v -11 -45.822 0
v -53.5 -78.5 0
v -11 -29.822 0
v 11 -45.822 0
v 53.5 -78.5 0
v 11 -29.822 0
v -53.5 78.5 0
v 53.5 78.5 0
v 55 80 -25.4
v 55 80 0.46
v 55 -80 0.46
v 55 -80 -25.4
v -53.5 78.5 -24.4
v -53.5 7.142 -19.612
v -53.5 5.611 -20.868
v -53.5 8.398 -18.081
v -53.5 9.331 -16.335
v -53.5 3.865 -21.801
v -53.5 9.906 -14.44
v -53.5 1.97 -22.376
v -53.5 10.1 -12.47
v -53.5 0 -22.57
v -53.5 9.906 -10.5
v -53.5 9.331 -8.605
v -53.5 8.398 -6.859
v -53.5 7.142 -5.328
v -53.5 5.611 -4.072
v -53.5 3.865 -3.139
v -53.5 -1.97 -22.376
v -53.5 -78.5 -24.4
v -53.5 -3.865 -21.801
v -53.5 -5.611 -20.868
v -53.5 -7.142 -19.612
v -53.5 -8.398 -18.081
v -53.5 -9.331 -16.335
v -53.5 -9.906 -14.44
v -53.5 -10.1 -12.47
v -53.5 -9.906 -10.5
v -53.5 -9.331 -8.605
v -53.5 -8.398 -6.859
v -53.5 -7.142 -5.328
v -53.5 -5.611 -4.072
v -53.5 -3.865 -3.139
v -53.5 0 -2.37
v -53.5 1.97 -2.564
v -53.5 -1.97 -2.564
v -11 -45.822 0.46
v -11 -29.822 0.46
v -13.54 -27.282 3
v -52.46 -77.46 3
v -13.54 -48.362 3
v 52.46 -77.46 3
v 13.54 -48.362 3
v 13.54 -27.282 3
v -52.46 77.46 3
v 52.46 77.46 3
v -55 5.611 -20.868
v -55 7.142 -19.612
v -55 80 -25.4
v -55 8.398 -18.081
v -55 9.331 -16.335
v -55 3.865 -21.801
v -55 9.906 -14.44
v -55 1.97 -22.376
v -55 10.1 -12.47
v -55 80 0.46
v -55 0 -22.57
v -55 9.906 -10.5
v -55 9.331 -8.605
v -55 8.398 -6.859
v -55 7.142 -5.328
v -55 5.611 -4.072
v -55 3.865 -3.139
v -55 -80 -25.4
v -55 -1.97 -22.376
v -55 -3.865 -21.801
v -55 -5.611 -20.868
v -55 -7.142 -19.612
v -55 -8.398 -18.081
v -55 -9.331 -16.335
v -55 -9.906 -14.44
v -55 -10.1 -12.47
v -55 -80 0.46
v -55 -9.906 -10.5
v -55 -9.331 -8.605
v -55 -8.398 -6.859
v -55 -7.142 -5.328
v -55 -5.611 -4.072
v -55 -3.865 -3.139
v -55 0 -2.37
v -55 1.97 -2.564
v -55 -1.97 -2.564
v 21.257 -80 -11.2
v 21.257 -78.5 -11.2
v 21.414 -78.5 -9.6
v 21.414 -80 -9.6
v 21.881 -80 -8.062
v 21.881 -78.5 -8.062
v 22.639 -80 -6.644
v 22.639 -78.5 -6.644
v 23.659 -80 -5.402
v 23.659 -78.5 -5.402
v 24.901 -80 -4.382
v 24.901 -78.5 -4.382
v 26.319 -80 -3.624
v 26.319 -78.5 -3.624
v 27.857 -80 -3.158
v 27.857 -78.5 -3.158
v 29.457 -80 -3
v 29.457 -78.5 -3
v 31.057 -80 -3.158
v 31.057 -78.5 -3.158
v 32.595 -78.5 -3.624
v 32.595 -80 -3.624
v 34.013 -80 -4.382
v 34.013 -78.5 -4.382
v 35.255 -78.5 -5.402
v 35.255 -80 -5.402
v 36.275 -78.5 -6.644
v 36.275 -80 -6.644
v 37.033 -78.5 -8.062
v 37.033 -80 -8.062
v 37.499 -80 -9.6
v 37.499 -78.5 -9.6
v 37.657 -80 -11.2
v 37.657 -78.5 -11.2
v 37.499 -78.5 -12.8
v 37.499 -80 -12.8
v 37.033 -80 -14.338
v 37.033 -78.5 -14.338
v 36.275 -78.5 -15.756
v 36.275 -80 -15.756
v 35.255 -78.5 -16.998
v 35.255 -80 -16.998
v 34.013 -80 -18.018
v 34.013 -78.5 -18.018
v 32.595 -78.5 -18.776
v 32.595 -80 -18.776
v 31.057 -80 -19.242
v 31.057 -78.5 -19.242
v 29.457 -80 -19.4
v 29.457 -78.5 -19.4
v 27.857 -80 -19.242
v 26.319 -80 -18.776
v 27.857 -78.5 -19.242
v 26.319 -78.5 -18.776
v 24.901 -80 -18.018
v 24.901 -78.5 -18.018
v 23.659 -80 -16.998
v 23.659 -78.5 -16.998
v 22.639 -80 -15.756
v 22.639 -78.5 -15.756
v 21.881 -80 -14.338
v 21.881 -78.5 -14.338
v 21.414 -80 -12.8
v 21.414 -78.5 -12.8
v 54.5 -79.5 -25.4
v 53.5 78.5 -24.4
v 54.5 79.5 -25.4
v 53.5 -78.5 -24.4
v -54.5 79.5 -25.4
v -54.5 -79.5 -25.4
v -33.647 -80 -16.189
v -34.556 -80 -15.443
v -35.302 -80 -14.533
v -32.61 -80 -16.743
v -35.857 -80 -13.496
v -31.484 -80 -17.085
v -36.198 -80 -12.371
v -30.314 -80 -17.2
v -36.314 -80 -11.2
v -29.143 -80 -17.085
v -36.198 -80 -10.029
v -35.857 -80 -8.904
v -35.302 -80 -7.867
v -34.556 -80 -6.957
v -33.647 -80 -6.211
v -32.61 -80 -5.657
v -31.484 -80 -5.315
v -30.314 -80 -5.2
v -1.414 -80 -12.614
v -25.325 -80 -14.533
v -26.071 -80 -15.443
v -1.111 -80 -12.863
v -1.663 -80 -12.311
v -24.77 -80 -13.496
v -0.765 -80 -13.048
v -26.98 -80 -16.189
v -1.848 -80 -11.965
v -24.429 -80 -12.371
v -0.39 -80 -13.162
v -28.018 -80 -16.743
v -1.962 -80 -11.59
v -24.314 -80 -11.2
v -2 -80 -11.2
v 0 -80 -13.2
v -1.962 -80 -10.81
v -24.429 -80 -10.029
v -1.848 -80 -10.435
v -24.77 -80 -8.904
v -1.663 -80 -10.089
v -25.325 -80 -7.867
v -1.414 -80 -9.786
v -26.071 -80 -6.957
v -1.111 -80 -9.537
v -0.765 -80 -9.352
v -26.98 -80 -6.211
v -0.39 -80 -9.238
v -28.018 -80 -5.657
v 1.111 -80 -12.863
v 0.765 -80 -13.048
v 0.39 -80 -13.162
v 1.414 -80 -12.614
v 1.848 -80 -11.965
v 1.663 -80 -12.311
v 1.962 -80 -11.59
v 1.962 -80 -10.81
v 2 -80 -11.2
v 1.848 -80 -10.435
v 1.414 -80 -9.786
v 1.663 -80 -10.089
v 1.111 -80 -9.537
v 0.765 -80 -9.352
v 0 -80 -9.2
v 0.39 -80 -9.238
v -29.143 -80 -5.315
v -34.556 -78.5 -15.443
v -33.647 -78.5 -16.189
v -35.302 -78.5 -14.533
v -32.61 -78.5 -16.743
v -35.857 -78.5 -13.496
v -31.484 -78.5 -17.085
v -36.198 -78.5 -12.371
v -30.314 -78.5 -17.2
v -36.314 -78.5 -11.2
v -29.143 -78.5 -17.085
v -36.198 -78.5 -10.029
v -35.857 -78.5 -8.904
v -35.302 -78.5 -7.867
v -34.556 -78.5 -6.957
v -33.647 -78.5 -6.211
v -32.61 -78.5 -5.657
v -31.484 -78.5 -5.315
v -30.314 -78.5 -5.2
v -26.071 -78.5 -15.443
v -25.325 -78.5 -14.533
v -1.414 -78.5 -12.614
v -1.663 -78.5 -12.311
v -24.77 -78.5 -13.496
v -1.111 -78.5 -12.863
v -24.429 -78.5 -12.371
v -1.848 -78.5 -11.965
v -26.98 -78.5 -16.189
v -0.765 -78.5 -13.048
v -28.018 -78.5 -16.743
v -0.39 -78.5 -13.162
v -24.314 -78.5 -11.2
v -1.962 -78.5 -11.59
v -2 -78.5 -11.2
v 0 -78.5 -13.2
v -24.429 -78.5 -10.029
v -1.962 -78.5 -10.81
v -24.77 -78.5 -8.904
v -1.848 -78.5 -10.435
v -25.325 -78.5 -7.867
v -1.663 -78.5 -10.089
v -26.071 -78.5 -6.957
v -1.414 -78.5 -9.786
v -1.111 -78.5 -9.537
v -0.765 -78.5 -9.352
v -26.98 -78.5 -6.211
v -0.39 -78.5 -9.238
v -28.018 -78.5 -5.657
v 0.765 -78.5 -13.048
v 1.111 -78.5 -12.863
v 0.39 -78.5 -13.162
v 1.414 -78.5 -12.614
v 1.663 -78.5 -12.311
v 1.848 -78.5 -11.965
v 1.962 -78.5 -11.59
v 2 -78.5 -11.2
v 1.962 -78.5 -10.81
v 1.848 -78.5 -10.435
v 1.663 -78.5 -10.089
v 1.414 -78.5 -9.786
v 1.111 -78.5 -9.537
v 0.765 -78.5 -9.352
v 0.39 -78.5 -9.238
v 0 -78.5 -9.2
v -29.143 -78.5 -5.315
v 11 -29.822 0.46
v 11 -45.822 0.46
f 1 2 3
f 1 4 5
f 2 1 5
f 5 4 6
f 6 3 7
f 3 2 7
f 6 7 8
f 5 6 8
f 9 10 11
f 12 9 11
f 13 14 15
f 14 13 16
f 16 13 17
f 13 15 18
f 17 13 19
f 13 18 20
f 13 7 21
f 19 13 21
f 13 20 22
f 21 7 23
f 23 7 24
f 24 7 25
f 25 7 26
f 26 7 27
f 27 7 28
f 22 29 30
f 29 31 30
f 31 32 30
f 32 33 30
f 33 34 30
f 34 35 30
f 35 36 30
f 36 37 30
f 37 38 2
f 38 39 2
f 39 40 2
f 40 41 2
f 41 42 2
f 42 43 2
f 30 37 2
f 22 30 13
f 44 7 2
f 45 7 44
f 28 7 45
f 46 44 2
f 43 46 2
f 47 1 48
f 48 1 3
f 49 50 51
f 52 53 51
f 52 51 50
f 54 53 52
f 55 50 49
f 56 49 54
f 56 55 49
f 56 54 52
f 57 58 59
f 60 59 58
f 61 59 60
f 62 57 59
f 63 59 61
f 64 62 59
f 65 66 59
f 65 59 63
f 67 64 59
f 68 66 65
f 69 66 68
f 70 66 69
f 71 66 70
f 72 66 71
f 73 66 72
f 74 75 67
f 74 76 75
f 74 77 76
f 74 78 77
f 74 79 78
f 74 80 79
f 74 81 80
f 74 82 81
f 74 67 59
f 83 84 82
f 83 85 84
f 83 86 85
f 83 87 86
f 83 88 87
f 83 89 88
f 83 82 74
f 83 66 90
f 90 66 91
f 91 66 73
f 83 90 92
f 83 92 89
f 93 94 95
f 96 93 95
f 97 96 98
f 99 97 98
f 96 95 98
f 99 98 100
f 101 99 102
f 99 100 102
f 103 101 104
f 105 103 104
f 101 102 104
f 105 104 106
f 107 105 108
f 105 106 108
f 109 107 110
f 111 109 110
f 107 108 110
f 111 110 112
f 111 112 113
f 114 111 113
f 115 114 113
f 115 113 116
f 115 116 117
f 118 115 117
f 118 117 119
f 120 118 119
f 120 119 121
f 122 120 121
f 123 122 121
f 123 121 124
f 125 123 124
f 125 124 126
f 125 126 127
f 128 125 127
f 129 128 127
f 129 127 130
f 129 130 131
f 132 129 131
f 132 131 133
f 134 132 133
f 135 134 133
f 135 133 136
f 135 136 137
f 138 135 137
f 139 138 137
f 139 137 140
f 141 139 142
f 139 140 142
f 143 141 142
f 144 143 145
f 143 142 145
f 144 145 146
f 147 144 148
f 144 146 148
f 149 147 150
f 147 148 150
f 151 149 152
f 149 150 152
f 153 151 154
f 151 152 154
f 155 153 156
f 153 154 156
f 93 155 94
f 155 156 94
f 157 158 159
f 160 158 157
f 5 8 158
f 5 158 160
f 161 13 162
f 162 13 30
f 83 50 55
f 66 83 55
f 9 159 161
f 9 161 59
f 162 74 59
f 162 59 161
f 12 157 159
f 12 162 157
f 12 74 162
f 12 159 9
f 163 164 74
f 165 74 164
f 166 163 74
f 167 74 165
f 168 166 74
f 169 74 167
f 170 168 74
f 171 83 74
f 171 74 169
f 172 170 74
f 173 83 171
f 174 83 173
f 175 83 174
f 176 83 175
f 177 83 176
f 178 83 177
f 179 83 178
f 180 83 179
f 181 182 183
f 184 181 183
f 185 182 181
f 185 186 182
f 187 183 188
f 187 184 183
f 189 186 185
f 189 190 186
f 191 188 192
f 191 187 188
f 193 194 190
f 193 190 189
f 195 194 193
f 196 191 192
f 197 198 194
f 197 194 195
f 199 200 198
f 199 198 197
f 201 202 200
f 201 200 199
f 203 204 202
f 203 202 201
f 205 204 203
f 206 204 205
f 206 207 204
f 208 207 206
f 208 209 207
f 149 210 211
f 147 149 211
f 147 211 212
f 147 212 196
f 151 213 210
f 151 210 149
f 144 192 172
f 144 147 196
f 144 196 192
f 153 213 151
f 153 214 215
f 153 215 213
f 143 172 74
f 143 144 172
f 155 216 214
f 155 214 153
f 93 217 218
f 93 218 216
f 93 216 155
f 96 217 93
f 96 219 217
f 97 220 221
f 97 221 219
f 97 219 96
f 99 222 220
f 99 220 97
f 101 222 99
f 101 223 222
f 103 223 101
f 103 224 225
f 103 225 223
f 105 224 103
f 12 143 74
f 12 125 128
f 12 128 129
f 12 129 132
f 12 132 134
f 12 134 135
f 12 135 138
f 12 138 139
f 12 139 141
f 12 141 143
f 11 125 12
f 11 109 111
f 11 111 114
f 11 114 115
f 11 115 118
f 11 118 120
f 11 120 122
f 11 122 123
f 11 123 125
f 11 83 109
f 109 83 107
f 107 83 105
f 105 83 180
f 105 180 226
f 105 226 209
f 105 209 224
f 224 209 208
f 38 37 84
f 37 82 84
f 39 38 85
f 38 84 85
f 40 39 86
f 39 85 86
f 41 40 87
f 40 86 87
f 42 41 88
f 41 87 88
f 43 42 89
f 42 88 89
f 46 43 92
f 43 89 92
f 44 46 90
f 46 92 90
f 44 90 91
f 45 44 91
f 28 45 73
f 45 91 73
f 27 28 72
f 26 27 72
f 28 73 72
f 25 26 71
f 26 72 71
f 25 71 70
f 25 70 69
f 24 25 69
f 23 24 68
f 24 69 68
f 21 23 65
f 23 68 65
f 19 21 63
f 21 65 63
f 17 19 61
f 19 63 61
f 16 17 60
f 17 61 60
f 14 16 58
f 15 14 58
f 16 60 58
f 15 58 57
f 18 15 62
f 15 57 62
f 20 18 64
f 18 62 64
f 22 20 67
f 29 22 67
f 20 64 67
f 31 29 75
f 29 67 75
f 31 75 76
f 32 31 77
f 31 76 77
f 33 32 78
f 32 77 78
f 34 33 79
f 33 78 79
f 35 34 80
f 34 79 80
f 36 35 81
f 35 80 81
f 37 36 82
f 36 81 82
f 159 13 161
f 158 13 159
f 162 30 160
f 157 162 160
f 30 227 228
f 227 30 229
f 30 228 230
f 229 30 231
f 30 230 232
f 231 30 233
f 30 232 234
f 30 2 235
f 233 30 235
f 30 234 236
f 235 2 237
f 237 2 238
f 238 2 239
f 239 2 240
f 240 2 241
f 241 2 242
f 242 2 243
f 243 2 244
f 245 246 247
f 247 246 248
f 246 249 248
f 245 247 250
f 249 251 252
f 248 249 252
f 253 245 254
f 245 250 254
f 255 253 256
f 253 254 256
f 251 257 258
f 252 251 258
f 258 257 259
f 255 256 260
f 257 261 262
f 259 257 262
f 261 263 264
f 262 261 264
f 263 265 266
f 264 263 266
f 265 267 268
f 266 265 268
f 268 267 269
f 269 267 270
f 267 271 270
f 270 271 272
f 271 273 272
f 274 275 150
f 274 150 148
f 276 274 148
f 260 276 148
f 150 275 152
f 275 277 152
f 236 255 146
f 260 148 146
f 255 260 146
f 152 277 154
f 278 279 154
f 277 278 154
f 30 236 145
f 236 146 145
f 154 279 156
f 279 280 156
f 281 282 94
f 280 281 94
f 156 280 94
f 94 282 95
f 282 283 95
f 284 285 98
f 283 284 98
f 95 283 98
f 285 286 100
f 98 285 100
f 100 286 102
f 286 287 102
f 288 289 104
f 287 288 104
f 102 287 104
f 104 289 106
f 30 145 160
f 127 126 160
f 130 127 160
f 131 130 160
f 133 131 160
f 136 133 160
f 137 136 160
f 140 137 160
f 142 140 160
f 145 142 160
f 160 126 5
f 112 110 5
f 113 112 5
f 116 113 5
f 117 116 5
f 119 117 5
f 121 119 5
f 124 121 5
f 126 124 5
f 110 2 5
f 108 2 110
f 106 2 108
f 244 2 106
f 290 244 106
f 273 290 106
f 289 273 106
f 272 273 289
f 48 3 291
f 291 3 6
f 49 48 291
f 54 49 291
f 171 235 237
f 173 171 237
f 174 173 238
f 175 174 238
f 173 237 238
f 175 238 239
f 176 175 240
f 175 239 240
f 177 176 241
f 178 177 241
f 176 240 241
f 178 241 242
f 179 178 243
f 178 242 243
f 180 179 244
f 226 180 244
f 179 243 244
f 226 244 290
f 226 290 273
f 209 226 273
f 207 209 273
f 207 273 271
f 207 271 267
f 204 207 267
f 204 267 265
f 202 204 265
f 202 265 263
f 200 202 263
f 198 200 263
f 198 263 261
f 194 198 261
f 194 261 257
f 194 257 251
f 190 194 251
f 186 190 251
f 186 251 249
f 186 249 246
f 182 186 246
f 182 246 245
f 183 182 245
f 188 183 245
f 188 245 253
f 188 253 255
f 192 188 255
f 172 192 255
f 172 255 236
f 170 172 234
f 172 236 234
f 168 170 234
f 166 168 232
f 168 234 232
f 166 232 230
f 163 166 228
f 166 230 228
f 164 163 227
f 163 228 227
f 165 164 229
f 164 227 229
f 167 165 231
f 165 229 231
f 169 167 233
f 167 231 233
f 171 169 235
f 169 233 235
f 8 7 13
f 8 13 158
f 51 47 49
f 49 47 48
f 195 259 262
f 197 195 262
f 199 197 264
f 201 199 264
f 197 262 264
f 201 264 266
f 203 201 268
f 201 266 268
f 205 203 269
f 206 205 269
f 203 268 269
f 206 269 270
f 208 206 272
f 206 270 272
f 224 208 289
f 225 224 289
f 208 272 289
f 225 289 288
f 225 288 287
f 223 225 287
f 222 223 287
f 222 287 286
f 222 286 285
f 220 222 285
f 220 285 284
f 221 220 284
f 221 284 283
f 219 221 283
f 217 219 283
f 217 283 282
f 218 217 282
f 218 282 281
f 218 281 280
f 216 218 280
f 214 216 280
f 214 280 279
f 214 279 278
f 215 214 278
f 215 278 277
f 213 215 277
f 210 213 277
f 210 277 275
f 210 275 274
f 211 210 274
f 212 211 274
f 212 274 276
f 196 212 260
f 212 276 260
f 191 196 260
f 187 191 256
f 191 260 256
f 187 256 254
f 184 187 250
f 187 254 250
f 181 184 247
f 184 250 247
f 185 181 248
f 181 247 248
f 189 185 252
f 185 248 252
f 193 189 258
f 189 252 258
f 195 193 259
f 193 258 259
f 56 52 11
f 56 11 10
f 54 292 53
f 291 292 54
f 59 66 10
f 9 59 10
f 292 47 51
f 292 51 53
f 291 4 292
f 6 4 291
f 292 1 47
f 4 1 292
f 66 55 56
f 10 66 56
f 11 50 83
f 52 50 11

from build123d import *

# Parameters (mm, degrees)
F0_W      = 110
F0_H      = 160
F0_W_2    = 22
F0_H_2    = 16
F1_DEPTH  = 3
F2_W      = 110
F2_H      = 160
F2_W_2    = 107
F2_H_2    = 157
F3_DEPTH  = 25.4
F5_D      = 16.4
F5_DEPTH  = 7.62
F6_D      = 4
F6_DEPTH  = 7.62
F7_D      = 12
F7_DEPTH  = 7.62
F8_SIZE   = 1
F9_SIZE   = 2.54
F10_R     = 10.1
F11_DEPTH = 12.7


with BuildPart() as f1:
    # F0 (on Top) → F1 (new body)
    with BuildSketch(Plane.XY):
        Rectangle(F0_W, F0_H)
        with Locations((0, -37.821583)):
            Rectangle(F0_W_2, F0_H_2, mode=Mode.SUBTRACT)
    extrude(amount=F1_DEPTH)

    # F2 (on face) → F3 (join)
    with BuildSketch(Plane(origin=(0, 0, 0), x_dir=(1, 0, 0), z_dir=(0, 0, -1))):
        Rectangle(F2_W, F2_H)
        Rectangle(F2_W_2, F2_H_2, mode=Mode.SUBTRACT)
    extrude(amount=F3_DEPTH)

    # F5
    with Locations(Plane.XZ.offset(80)):
        with Locations((29.456884, -11.2)):
            Hole(F5_D / 2, depth=F5_DEPTH)

    # F6
    with Locations(Plane.XZ.offset(80)):
        with Locations((0, -11.2)):
            Hole(F6_D / 2, depth=F6_DEPTH)

    # F7
    with Locations(Plane.XZ.offset(80)):
        with Locations((-30.313604, -11.2)):
            Hole(F7_D / 2, depth=F7_DEPTH)

    # F8
    f8_edges = [f1.edges().sort_by_distance(p)[0] for p in [
        (53.5, 0, -25.4),
        (0, 78.5, -25.4),
        (-53.5, 0, -25.4),
        (0, -78.5, -25.4),
    ]]
    chamfer(f8_edges, length=F8_SIZE)

    # F9
    f9_edges = [f1.edges().sort_by_distance(p)[0] for p in [
        (0, -45.821583, 3),
        (-11, -37.821583, 3),
        (11, -37.821583, 3),
        (-55, 0, 3),
        (0, -80, 3),
        (55, 0, 3),
        (0, 80, 3),
        (0, -29.821583, 3),
    ]]
    chamfer(f9_edges, length=F9_SIZE)

    # F10 (on face) → F11 (cut, symmetric)
    with BuildSketch(Plane(origin=(-55, 0, 0), x_dir=(0, -1, 0), z_dir=(-1, 0, 0))):
        with Locations((0, -12.47)):
            Circle(F10_R)
    extrude(amount=F11_DEPTH, both=True, mode=Mode.SUBTRACT)


solid = f1.part
